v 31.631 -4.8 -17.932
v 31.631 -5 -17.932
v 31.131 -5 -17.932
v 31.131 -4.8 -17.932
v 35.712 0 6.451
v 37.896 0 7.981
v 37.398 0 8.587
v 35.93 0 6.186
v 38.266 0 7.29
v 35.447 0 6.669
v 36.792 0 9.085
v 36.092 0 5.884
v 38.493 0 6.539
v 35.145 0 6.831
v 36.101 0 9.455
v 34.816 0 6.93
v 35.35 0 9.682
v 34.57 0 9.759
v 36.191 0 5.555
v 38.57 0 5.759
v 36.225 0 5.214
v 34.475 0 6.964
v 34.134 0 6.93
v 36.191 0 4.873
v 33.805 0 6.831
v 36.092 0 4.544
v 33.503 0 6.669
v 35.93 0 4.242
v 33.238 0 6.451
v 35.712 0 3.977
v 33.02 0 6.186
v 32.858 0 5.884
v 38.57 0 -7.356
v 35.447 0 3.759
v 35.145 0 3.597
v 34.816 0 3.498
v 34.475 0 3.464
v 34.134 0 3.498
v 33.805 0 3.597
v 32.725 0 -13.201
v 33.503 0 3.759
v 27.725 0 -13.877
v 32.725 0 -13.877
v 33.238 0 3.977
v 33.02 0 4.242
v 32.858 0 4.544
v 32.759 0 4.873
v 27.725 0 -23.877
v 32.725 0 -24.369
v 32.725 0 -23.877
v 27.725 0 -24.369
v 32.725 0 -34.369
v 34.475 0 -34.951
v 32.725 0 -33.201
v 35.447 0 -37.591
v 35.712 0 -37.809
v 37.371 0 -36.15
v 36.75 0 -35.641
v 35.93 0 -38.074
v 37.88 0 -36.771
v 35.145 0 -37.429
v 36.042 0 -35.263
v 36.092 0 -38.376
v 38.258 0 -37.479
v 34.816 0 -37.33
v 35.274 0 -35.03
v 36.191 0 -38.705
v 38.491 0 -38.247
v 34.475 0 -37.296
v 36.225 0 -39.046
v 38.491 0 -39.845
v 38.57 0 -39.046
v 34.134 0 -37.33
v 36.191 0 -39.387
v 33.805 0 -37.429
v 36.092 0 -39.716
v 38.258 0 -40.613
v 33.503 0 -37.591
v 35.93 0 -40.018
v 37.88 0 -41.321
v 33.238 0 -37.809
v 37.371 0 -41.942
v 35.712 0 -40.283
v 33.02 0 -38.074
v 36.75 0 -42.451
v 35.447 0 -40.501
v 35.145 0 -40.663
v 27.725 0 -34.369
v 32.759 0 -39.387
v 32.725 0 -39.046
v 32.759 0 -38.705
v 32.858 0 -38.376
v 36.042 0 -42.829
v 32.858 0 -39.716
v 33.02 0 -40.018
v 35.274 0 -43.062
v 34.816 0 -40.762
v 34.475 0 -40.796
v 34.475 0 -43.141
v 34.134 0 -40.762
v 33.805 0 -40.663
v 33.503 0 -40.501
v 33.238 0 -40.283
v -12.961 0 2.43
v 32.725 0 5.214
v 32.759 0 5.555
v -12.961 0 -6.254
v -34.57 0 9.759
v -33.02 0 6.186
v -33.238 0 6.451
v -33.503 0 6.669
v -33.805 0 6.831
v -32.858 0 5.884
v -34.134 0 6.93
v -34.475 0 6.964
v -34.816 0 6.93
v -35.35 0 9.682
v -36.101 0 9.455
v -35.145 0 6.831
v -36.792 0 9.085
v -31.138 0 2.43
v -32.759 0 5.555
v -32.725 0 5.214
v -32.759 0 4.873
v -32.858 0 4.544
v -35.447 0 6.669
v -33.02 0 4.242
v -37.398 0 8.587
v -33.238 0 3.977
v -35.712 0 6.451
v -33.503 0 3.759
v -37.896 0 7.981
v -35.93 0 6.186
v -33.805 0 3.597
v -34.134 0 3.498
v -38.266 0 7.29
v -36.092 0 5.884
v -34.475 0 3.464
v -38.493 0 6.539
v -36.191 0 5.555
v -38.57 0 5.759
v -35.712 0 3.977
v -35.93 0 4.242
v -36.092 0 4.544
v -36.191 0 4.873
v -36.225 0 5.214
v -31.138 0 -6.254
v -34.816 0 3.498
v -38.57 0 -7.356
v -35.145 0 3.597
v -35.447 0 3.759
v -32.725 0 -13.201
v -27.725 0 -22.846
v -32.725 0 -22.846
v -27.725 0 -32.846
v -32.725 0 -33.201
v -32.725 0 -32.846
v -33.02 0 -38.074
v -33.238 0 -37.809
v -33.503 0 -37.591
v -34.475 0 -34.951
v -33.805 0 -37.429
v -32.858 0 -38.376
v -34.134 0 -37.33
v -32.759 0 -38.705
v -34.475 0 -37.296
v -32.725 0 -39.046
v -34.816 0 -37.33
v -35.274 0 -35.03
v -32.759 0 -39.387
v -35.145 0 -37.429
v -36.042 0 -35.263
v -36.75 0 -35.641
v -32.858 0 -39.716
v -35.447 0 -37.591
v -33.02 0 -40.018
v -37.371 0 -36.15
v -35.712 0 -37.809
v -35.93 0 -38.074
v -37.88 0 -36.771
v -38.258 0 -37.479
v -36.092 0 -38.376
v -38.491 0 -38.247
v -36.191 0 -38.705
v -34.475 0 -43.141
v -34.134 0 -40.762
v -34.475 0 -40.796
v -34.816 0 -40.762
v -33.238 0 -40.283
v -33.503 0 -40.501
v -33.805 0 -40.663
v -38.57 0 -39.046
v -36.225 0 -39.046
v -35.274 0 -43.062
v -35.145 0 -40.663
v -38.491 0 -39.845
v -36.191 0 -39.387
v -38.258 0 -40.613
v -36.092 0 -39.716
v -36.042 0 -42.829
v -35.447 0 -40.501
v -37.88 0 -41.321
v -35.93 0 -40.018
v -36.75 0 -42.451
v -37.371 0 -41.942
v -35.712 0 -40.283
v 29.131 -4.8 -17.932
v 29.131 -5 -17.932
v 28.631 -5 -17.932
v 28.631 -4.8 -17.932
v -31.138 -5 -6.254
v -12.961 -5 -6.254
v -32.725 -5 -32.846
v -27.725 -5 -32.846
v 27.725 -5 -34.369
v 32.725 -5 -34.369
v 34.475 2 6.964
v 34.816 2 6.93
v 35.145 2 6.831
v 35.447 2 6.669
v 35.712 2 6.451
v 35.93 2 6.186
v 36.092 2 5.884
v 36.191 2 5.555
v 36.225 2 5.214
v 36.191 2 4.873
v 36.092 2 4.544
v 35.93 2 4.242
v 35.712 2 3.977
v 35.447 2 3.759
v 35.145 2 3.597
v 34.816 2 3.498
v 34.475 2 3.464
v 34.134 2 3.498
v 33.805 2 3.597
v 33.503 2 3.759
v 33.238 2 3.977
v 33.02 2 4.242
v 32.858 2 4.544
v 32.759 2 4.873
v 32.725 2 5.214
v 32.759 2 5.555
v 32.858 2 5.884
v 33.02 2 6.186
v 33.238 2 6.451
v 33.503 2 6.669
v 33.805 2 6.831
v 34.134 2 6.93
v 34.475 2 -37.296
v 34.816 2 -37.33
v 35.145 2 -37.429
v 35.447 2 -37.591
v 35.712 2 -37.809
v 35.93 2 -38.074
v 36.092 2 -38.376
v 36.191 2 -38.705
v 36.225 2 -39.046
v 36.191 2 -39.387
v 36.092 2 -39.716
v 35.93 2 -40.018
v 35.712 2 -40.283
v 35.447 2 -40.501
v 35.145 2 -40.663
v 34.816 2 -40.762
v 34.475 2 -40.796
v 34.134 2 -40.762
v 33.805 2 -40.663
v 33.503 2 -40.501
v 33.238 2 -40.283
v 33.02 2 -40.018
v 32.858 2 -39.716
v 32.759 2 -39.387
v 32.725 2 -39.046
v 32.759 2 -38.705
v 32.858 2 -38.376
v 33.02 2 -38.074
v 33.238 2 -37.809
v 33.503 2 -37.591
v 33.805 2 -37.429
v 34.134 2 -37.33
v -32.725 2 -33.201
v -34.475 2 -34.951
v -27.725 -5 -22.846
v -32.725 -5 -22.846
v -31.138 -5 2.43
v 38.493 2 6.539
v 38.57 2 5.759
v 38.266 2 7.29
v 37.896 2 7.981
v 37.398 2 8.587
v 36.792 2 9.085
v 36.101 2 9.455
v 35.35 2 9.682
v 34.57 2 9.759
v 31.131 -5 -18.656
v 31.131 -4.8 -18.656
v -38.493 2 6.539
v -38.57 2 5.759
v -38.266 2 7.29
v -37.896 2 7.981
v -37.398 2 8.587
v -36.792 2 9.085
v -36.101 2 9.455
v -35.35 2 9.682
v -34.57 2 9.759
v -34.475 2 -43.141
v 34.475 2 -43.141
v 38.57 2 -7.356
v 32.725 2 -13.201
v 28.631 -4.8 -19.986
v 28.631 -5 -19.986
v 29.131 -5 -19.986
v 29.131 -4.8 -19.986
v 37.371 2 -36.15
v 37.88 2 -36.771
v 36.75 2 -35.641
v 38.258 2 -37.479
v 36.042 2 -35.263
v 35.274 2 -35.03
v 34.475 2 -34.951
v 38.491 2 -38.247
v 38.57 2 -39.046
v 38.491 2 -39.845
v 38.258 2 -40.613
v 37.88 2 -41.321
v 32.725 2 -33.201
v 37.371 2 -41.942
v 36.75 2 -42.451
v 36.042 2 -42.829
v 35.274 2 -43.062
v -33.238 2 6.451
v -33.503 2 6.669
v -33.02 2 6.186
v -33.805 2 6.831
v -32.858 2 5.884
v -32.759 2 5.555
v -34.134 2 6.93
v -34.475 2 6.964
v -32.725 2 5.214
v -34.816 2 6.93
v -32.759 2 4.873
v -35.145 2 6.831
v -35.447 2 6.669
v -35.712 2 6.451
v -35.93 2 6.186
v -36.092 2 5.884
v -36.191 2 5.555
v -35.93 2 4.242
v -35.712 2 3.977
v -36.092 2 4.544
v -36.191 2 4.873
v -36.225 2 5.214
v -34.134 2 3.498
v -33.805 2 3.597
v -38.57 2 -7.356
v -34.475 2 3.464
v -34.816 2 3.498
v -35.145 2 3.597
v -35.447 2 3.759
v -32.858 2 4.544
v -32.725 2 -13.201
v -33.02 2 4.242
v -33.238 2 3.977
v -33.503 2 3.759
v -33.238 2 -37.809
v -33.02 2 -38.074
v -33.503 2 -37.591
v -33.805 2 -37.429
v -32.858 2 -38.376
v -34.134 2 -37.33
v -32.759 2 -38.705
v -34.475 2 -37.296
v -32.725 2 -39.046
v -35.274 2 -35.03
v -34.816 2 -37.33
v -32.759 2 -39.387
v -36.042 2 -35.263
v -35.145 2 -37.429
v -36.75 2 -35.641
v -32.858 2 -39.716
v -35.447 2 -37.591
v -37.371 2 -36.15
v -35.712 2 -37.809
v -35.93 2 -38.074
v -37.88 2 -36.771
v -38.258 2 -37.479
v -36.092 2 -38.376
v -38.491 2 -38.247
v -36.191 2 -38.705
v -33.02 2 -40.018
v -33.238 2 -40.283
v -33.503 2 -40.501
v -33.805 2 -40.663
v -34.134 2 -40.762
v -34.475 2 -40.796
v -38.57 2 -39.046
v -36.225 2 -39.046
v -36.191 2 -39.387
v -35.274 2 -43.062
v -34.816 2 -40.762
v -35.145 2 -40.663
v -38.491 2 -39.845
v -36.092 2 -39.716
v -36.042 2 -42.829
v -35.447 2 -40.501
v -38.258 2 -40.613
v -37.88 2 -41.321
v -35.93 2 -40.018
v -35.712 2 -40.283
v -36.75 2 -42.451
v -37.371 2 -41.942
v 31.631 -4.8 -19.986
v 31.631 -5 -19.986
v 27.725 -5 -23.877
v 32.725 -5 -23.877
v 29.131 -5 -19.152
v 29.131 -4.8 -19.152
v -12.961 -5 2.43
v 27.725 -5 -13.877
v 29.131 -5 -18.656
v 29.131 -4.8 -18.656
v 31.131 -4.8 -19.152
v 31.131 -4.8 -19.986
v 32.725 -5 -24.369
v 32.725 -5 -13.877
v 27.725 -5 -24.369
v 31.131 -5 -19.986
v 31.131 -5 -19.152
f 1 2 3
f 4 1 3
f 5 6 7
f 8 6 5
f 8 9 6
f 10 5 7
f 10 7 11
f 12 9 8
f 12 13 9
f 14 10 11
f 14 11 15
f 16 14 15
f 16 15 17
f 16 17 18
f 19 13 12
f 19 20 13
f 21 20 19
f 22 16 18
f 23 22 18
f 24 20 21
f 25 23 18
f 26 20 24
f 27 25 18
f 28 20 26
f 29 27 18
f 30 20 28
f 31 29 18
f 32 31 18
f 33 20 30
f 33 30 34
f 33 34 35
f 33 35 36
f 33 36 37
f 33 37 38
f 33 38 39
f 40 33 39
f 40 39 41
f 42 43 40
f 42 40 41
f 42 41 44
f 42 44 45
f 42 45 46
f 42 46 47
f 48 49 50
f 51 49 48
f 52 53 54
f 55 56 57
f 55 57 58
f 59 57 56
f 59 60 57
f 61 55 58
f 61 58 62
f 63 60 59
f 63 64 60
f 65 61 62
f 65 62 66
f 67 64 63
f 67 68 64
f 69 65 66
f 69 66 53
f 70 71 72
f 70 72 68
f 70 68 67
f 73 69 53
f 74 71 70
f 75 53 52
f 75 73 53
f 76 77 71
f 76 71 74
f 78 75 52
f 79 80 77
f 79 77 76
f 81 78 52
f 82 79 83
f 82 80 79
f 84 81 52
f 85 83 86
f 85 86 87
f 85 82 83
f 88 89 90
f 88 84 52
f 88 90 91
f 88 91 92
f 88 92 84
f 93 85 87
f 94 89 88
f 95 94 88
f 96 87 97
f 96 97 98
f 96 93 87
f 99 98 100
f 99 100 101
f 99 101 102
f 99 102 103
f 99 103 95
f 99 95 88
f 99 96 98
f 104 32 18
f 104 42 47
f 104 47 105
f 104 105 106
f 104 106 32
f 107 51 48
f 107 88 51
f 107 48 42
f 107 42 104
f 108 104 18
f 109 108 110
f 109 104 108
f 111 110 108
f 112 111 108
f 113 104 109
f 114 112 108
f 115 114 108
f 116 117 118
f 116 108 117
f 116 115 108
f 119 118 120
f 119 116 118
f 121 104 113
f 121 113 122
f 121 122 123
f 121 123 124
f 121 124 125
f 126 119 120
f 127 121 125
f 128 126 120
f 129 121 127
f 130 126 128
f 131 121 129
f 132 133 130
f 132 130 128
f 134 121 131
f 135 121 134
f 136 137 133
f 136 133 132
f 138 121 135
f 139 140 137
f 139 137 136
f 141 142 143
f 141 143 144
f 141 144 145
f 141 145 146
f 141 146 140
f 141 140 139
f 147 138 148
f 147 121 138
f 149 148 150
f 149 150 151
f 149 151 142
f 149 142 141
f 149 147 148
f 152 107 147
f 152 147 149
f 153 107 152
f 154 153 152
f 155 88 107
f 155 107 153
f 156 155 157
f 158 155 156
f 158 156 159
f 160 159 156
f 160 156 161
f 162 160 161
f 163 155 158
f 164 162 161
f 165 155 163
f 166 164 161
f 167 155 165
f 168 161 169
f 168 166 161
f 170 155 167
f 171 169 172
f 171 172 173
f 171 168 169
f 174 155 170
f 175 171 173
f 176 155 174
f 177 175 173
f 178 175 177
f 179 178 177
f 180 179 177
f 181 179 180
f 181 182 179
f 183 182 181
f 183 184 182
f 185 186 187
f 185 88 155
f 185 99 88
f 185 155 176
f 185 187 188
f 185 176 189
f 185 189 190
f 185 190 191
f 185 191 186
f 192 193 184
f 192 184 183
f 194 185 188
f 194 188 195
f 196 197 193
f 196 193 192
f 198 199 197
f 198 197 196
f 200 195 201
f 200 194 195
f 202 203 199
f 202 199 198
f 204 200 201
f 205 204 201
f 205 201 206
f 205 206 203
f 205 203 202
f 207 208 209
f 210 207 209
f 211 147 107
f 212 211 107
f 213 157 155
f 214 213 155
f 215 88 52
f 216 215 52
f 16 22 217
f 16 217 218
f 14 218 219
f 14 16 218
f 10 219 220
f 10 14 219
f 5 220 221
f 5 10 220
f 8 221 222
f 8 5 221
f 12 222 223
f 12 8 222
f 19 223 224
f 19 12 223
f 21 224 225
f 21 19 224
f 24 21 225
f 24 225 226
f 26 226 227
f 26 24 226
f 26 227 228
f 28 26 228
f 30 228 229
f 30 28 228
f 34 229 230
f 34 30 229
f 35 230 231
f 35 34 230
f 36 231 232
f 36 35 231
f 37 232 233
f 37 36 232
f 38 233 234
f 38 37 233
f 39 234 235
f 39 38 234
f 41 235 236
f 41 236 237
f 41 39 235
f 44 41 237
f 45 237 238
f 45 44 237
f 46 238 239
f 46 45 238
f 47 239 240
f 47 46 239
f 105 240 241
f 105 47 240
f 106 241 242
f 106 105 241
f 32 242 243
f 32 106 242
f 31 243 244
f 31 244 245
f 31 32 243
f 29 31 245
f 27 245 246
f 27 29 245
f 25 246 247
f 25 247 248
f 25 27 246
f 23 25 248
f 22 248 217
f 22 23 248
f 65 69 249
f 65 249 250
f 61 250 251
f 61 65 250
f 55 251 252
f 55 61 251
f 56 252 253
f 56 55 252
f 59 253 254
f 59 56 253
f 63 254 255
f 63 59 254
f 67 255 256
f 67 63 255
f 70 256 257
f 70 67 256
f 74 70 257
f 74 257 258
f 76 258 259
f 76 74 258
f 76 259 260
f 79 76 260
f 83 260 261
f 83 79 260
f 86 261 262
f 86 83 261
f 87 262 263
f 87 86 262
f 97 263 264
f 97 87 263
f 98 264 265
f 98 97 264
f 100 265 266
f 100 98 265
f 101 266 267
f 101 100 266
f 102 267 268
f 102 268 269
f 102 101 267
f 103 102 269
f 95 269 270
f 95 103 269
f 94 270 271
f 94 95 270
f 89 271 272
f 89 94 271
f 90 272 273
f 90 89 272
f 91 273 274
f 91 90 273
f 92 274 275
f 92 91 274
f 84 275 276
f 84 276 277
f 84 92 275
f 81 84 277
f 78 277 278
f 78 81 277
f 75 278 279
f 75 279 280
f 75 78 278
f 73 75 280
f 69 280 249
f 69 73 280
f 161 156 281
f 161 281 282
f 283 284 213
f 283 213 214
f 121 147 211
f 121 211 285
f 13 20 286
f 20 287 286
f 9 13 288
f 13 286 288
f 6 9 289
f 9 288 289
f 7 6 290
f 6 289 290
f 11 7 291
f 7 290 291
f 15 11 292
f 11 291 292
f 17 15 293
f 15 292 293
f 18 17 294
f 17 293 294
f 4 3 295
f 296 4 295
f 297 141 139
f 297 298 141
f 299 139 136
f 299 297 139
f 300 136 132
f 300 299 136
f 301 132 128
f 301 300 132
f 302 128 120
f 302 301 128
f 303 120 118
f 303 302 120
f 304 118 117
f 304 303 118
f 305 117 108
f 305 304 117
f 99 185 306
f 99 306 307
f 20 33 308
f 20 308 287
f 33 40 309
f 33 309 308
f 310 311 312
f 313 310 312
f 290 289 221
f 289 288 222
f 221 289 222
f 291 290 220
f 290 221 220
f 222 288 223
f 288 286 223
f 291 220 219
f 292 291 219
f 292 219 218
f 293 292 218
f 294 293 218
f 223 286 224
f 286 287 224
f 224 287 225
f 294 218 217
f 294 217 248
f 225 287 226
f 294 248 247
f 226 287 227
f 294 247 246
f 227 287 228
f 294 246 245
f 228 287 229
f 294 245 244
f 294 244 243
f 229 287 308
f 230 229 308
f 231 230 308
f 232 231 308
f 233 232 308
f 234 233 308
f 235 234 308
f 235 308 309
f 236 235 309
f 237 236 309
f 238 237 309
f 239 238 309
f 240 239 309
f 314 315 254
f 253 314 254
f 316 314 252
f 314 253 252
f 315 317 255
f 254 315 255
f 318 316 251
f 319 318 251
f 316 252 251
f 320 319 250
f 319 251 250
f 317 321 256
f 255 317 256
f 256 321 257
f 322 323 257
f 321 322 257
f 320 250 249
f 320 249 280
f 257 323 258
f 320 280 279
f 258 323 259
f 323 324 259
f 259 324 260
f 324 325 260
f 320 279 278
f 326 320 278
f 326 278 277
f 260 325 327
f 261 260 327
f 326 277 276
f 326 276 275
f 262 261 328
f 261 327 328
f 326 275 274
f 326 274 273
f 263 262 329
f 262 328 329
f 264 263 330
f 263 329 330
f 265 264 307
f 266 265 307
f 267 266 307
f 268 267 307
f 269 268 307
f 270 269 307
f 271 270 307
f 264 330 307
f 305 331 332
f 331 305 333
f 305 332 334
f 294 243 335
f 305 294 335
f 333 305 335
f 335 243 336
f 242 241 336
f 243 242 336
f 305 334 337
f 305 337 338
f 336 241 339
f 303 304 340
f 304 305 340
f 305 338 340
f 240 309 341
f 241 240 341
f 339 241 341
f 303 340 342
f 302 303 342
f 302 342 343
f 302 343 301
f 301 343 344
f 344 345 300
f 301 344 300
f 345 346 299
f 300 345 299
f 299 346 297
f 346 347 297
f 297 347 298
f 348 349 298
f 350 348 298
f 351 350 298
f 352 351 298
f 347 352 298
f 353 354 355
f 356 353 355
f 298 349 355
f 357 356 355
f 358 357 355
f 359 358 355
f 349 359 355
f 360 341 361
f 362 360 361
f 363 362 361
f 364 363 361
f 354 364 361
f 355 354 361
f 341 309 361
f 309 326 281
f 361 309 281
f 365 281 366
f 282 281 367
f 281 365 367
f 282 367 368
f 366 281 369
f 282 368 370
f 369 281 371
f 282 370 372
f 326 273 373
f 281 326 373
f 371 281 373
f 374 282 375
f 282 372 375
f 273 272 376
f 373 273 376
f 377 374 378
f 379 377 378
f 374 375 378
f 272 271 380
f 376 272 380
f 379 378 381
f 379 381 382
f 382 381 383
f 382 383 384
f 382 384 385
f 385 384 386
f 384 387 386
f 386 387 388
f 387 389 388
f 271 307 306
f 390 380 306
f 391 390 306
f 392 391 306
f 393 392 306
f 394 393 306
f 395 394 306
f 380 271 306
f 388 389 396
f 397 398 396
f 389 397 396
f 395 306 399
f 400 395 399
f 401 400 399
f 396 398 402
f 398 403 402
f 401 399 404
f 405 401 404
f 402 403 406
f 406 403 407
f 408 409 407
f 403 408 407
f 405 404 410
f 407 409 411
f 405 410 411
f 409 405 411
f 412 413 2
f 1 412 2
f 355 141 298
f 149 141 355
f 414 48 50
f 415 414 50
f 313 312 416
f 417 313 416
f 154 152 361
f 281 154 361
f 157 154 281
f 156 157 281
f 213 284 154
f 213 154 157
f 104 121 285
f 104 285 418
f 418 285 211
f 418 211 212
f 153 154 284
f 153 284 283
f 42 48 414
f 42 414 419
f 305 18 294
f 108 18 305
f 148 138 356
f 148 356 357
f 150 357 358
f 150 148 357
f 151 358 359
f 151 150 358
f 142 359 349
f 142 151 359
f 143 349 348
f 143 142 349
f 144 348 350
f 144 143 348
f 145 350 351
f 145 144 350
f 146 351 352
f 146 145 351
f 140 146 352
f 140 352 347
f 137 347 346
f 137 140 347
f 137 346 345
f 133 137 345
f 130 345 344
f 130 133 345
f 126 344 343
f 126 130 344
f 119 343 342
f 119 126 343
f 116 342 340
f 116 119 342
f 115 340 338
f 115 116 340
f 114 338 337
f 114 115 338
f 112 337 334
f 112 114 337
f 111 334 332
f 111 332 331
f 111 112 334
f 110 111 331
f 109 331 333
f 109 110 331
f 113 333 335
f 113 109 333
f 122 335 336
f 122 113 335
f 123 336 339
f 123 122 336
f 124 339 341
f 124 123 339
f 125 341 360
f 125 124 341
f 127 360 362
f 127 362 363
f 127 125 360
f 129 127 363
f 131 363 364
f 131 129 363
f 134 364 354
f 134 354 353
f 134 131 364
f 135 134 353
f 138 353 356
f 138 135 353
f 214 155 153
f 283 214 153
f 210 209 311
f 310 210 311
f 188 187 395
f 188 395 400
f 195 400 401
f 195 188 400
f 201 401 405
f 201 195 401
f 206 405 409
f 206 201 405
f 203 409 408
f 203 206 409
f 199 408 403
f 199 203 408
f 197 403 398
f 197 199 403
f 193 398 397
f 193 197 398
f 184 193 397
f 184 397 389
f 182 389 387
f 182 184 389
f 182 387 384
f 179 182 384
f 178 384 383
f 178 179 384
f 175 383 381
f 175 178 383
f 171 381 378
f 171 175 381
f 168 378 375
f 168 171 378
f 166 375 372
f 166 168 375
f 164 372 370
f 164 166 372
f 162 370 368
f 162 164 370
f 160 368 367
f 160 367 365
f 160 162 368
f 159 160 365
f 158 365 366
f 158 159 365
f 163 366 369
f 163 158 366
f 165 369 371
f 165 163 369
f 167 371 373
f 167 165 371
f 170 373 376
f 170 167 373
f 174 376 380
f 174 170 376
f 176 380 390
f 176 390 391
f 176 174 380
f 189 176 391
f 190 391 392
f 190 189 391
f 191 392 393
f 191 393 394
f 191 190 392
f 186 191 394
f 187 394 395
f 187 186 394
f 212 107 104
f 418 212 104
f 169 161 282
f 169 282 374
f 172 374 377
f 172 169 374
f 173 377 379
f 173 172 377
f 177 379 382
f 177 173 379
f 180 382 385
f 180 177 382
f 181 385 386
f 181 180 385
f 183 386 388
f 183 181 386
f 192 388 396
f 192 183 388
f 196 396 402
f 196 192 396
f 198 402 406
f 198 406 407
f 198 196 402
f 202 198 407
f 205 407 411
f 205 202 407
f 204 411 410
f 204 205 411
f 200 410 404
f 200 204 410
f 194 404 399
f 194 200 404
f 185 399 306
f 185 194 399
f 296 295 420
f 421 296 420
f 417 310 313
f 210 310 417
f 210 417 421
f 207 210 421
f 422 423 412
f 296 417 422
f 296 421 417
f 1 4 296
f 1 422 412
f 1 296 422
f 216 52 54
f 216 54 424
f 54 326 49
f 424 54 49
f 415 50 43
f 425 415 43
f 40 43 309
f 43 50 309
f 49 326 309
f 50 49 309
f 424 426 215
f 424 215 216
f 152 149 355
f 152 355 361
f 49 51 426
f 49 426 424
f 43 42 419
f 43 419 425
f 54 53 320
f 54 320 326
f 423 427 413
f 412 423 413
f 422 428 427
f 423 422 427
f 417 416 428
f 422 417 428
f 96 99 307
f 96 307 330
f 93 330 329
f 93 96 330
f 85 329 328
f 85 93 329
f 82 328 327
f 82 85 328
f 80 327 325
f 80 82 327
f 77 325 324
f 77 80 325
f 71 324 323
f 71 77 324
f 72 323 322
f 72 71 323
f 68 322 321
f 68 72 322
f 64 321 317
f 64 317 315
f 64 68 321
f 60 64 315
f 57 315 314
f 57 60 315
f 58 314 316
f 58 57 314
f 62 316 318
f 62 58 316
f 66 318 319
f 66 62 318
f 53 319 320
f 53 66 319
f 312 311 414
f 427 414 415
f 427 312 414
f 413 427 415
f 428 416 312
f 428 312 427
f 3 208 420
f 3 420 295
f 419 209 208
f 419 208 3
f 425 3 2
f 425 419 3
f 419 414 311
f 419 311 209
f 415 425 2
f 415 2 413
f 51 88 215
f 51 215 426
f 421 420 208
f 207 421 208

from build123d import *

# Parameters (mm, degrees)
SKETCH_1_R          = 1.75
EXTRUDE_1_DEPTH     = 2
FILLET_1_R          = 4
SKETCH_2_W          = 5
SKETCH_2_H          = 10
EXTRUDE_2_DEPTH     = 5
CUT_EXTRUDE_1_DEPTH = 0.2
SKETCH_5_W          = 18.176567436
SKETCH_5_H          = 8.683574631
EXTRUDE_3_DEPTH     = 5


with BuildPart() as part:
    # 草图1 → 凸台-拉伸1 (new body)
    with BuildSketch(Plane(origin=(0, 0, 0), x_dir=(1, 0, 0), z_dir=(0, 1, 0))):
        with BuildLine():
            Line((-34.475, 43.140944253), (34.475, 43.140944253))
            ThreePointArc((34.475, 43.140944253), (38.57, 39.045944253), (34.475, 34.950944253))
            Line((34.475, 34.950944253), (32.725, 33.200944253))
            Line((32.725, 33.200944253), (32.725, 13.200944253))
            Line((32.725, 13.200944253), (38.57, 7.355944253))
            Line((38.57, 7.355944253), (38.57, -9.759055747))
            Line((38.57, -9.759055747), (-38.57, -9.759055747))
            Line((-38.57, -9.759055747), (-38.57, 7.355944253))
            Line((-38.57, 7.355944253), (-32.725, 13.200944253))
            Line((-32.725, 13.200944253), (-32.725, 33.200944253))
            Line((-32.725, 33.200944253), (-34.475, 34.950944253))
            ThreePointArc((-34.475, 34.950944253), (-38.57, 39.045944253), (-34.475, 43.140944253))
        make_face()
        with Locations(Location((34.475, 39.045944253, 0), (0, 0, 270))):
            Circle(SKETCH_1_R, mode=Mode.SUBTRACT)
        with Locations(Location((34.475, -5.214055747, 0), (0, 0, 270))):
            Circle(SKETCH_1_R, mode=Mode.SUBTRACT)
        with Locations(Location((-34.475, -5.214055747, 0), (0, 0, 90))):
            Circle(SKETCH_1_R, mode=Mode.SUBTRACT)
        with Locations(Location((-34.475, 39.045944253, 0), (0, 0, 90))):
            Circle(SKETCH_1_R, mode=Mode.SUBTRACT)
    extrude(amount=EXTRUDE_1_DEPTH)

    # 圆角1
    fillet_1_edges = [part.edges().sort_by_distance(p)[0] for p in [
        (38.57, 1, 9.759055747),
        (-38.57, 1, 9.759055747),
    ]]
    fillet(fillet_1_edges, radius=FILLET_1_R)

    # 草图2 → 凸台-拉伸2 (add)
    with BuildSketch(Plane.XZ):
        with Locations((30.225, -29.368896619)):
            Rectangle(SKETCH_2_W, SKETCH_2_H)
        with Locations((-30.225, -27.845518443)):
            Rectangle(SKETCH_2_W, SKETCH_2_H)
        with Locations((30.225, -18.877356426)):
            Rectangle(SKETCH_2_W, SKETCH_2_H)
    extrude(amount=EXTRUDE_2_DEPTH)

    # 草图4 → 切除-拉伸1 (cut)
    with BuildSketch(Plane.XZ.offset(5)):
        Polygon((31.631043608, -19.986230369), (31.631043608, -17.932277654), (31.131043608, -17.932277654), (31.131043608, -18.656291548), (29.131043608, -18.656291548), (29.131043608, -17.932277654), (28.631043608, -17.932277654), (28.631043608, -19.986230369), (29.131043608, -19.986230369), (29.131043608, -19.151981589), (31.131043608, -19.151981589), (31.131043608, -19.986230369), align=None)
    extrude(amount=-CUT_EXTRUDE_1_DEPTH, mode=Mode.SUBTRACT)

    # 草图5 → 凸台-拉伸3 (add)
    with BuildSketch(Plane.XZ):
        with Locations((-22.049742487, -1.912133925)):
            Rectangle(SKETCH_5_W, SKETCH_5_H)
    extrude(amount=EXTRUDE_3_DEPTH)


solid = part.part
